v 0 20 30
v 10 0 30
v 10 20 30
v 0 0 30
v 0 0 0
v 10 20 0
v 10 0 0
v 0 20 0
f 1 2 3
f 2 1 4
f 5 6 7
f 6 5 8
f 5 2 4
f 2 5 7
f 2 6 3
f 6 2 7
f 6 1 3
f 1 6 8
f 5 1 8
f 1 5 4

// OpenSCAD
// Construct: cube() with a [x,y,z] size vector.
cube([10, 20, 30]);
